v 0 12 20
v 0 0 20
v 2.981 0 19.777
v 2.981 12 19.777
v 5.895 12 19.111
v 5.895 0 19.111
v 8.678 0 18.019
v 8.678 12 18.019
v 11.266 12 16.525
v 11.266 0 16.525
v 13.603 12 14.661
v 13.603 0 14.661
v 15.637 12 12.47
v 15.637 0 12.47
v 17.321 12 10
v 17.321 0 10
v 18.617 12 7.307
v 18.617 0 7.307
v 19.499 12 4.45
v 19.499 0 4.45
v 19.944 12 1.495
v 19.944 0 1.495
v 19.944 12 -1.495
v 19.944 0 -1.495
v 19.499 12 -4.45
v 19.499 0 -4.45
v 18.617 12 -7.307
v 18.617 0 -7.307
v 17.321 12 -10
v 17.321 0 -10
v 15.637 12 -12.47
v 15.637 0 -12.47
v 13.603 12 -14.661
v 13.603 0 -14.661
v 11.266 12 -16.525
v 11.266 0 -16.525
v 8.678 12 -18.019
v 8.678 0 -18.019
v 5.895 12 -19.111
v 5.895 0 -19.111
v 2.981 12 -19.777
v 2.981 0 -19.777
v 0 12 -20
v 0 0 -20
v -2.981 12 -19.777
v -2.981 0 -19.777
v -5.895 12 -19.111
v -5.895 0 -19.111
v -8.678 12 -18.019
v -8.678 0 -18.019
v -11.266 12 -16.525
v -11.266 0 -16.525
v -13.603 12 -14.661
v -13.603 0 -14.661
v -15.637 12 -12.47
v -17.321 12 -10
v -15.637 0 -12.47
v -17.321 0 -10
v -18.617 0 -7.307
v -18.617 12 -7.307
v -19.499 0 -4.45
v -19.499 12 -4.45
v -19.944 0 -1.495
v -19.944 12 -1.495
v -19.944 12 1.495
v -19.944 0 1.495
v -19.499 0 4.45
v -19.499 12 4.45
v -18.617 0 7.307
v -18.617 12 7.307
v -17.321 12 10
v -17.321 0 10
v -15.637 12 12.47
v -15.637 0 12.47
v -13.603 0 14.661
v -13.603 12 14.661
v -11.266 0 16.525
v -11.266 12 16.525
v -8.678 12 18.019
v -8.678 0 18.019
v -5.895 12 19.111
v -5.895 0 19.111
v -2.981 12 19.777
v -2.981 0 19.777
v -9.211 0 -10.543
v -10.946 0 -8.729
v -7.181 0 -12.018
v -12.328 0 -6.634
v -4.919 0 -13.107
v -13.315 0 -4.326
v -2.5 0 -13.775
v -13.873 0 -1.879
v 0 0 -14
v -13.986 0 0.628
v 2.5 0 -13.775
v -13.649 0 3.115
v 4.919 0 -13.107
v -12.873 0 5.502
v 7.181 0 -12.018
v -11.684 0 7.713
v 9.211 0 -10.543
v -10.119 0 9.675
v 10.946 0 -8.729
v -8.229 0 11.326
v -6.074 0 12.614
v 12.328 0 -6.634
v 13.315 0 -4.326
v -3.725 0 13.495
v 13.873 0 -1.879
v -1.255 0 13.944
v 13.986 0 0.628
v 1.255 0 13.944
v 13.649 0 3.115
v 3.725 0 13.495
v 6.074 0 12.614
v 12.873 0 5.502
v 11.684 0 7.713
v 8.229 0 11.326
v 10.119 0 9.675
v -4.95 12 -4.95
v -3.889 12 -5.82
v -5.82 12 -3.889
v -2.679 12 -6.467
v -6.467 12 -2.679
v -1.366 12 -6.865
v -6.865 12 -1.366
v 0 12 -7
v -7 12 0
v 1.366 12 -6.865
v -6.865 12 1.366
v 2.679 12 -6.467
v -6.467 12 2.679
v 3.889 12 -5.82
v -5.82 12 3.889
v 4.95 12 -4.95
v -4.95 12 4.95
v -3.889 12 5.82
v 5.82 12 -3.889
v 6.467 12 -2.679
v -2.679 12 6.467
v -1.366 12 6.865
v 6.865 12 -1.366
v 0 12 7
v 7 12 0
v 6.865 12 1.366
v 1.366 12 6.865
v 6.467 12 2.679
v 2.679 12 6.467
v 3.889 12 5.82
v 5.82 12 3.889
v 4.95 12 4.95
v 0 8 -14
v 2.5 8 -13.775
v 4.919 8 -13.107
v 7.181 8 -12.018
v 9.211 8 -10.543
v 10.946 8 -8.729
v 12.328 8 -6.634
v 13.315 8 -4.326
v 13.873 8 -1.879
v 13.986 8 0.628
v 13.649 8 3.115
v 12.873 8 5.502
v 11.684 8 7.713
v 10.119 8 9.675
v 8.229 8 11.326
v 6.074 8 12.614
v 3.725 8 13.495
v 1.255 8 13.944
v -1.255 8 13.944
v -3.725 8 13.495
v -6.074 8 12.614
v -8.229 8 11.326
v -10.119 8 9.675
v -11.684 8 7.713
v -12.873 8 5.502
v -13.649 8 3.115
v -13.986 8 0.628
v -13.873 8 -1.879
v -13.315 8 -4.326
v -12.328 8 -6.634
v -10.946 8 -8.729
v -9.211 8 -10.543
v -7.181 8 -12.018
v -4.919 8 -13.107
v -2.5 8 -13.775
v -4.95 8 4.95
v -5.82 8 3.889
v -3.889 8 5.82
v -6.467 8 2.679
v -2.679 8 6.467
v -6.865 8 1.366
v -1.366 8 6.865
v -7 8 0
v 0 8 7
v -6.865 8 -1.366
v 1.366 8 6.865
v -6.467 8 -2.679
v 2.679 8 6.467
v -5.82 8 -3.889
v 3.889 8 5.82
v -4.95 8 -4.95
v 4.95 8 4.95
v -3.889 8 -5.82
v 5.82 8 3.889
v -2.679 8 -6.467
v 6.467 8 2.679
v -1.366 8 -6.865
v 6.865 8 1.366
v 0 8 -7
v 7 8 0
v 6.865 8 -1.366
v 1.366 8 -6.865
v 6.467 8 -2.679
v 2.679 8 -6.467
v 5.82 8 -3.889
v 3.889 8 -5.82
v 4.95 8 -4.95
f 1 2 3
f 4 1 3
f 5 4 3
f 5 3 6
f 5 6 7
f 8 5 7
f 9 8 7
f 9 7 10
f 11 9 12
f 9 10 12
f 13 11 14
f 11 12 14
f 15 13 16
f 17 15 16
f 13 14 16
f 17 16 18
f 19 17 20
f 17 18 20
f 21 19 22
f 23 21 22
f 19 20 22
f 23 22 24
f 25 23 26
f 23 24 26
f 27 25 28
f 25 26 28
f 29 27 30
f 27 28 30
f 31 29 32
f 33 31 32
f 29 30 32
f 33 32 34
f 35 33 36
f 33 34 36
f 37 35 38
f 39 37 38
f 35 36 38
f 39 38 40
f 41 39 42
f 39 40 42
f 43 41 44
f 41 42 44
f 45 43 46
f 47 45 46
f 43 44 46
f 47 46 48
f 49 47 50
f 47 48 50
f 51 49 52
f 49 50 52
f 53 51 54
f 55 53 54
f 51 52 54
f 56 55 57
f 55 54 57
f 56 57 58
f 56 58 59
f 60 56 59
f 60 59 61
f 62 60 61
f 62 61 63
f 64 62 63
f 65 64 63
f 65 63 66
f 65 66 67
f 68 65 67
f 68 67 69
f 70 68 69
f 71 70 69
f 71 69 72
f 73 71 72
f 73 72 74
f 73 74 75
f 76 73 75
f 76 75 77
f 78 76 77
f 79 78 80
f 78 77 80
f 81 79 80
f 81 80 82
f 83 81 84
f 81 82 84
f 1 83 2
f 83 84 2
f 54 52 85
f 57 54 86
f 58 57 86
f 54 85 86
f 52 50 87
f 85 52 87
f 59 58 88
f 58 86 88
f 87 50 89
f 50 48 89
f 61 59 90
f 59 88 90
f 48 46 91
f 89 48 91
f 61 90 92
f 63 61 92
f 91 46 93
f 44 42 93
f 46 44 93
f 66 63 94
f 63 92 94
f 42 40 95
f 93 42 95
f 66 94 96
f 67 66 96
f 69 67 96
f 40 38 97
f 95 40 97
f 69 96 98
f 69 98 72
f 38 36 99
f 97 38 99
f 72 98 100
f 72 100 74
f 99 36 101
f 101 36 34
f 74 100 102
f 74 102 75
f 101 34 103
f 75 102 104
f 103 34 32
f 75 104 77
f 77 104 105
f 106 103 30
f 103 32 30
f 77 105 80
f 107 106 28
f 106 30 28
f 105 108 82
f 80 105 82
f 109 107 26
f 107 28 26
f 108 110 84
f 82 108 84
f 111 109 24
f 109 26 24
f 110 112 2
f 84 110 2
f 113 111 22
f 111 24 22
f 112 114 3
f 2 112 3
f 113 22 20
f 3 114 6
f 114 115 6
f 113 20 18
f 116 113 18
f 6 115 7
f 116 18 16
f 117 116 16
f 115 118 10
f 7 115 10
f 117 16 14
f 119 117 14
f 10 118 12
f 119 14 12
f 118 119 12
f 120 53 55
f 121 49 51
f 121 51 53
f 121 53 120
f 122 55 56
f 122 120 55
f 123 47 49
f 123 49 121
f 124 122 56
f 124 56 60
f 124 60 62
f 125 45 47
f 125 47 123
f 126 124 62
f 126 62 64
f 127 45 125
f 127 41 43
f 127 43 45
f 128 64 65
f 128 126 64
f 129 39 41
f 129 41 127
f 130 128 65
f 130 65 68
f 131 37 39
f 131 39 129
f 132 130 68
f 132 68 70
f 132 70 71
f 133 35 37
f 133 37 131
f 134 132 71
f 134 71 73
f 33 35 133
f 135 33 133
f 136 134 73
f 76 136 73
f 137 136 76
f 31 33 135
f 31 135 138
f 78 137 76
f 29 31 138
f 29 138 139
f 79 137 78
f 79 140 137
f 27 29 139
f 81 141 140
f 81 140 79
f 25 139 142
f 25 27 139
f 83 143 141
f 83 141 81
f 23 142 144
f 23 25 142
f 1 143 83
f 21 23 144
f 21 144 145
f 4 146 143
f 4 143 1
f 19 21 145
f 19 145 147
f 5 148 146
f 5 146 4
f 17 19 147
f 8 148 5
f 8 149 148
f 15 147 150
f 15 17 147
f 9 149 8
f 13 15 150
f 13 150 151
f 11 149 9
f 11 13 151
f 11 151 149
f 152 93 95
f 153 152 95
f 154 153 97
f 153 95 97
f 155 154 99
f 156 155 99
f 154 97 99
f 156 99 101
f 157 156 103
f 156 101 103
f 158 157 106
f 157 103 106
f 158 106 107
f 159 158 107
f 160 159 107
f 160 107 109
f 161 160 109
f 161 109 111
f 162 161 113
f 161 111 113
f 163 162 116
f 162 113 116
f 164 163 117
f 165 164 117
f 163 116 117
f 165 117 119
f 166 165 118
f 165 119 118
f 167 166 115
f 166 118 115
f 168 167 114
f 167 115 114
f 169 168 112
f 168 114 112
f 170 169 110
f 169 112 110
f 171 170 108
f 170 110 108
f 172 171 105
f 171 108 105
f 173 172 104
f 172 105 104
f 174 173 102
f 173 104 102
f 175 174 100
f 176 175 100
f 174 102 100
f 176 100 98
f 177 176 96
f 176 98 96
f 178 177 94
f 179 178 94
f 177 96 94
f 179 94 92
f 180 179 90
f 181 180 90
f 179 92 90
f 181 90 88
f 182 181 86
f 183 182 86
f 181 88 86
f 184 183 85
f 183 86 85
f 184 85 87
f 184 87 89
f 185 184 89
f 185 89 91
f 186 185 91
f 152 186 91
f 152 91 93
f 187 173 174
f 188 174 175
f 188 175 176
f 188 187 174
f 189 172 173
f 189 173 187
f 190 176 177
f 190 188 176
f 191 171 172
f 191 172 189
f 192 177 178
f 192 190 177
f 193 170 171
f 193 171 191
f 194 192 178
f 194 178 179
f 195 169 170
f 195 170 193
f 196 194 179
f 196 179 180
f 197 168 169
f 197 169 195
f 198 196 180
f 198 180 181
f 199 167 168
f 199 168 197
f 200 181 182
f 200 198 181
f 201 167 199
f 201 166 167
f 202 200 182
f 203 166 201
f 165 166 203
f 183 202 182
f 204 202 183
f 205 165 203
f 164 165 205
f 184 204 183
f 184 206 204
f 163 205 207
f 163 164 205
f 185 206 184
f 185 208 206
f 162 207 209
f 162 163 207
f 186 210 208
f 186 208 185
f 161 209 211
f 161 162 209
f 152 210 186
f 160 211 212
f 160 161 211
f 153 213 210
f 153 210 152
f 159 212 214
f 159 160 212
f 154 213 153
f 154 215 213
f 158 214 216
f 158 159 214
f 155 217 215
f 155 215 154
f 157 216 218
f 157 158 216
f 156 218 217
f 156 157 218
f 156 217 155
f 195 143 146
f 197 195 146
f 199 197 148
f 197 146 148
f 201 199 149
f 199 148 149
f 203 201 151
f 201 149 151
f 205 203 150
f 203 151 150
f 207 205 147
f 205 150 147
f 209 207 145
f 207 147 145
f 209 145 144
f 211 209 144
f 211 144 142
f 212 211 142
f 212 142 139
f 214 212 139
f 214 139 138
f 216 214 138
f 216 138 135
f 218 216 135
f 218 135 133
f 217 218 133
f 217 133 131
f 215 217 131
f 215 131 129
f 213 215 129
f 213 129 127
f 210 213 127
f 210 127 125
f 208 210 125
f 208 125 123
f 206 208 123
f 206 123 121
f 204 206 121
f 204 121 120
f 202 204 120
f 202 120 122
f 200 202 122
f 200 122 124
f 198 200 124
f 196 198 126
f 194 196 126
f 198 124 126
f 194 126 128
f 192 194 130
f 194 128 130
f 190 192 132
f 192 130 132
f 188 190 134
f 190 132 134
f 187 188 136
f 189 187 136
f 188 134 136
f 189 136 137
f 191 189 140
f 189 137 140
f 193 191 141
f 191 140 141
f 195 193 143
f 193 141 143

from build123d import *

# Parameters (mm, degrees)
SKETCH_1_R          = 20
EXTRUDE_1_DEPTH     = 12
SKETCH_3_R          = 14
CUT_EXTRUDE_3_DEPTH = 8
SKETCH_4_R          = 7
CUT_EXTRUDE_4_DEPTH = 31.724582991


with BuildPart() as part:
    # Эскиз1 → Вытянуть1 (new body)
    with BuildSketch(Plane(origin=(0, 0, 0), x_dir=(1, 0, 0), z_dir=(0, 1, 0))):
        with Locations(Location((0, 0, 0), (0, 0, 270))):
            Circle(SKETCH_1_R)
    extrude(amount=EXTRUDE_1_DEPTH)

    # Эскиз3 → Вытянуть3 (cut)
    with BuildSketch(Plane.XZ):
        with Locations(Location((0, 0, 0), (0, 0, 270))):
            Circle(SKETCH_3_R)
    extrude(amount=-CUT_EXTRUDE_3_DEPTH, mode=Mode.SUBTRACT)

    # Эскиз4 → Вытянуть4 (cut, through all)
    with BuildSketch(Plane(origin=(0, 12, 0), x_dir=(1, 0, 0), z_dir=(0, 1, 0))):
        with Locations(Location((0, 0, 0), (0, 0, 270))):
            Circle(SKETCH_4_R)
    extrude(amount=-CUT_EXTRUDE_4_DEPTH, mode=Mode.SUBTRACT)


solid = part.part
